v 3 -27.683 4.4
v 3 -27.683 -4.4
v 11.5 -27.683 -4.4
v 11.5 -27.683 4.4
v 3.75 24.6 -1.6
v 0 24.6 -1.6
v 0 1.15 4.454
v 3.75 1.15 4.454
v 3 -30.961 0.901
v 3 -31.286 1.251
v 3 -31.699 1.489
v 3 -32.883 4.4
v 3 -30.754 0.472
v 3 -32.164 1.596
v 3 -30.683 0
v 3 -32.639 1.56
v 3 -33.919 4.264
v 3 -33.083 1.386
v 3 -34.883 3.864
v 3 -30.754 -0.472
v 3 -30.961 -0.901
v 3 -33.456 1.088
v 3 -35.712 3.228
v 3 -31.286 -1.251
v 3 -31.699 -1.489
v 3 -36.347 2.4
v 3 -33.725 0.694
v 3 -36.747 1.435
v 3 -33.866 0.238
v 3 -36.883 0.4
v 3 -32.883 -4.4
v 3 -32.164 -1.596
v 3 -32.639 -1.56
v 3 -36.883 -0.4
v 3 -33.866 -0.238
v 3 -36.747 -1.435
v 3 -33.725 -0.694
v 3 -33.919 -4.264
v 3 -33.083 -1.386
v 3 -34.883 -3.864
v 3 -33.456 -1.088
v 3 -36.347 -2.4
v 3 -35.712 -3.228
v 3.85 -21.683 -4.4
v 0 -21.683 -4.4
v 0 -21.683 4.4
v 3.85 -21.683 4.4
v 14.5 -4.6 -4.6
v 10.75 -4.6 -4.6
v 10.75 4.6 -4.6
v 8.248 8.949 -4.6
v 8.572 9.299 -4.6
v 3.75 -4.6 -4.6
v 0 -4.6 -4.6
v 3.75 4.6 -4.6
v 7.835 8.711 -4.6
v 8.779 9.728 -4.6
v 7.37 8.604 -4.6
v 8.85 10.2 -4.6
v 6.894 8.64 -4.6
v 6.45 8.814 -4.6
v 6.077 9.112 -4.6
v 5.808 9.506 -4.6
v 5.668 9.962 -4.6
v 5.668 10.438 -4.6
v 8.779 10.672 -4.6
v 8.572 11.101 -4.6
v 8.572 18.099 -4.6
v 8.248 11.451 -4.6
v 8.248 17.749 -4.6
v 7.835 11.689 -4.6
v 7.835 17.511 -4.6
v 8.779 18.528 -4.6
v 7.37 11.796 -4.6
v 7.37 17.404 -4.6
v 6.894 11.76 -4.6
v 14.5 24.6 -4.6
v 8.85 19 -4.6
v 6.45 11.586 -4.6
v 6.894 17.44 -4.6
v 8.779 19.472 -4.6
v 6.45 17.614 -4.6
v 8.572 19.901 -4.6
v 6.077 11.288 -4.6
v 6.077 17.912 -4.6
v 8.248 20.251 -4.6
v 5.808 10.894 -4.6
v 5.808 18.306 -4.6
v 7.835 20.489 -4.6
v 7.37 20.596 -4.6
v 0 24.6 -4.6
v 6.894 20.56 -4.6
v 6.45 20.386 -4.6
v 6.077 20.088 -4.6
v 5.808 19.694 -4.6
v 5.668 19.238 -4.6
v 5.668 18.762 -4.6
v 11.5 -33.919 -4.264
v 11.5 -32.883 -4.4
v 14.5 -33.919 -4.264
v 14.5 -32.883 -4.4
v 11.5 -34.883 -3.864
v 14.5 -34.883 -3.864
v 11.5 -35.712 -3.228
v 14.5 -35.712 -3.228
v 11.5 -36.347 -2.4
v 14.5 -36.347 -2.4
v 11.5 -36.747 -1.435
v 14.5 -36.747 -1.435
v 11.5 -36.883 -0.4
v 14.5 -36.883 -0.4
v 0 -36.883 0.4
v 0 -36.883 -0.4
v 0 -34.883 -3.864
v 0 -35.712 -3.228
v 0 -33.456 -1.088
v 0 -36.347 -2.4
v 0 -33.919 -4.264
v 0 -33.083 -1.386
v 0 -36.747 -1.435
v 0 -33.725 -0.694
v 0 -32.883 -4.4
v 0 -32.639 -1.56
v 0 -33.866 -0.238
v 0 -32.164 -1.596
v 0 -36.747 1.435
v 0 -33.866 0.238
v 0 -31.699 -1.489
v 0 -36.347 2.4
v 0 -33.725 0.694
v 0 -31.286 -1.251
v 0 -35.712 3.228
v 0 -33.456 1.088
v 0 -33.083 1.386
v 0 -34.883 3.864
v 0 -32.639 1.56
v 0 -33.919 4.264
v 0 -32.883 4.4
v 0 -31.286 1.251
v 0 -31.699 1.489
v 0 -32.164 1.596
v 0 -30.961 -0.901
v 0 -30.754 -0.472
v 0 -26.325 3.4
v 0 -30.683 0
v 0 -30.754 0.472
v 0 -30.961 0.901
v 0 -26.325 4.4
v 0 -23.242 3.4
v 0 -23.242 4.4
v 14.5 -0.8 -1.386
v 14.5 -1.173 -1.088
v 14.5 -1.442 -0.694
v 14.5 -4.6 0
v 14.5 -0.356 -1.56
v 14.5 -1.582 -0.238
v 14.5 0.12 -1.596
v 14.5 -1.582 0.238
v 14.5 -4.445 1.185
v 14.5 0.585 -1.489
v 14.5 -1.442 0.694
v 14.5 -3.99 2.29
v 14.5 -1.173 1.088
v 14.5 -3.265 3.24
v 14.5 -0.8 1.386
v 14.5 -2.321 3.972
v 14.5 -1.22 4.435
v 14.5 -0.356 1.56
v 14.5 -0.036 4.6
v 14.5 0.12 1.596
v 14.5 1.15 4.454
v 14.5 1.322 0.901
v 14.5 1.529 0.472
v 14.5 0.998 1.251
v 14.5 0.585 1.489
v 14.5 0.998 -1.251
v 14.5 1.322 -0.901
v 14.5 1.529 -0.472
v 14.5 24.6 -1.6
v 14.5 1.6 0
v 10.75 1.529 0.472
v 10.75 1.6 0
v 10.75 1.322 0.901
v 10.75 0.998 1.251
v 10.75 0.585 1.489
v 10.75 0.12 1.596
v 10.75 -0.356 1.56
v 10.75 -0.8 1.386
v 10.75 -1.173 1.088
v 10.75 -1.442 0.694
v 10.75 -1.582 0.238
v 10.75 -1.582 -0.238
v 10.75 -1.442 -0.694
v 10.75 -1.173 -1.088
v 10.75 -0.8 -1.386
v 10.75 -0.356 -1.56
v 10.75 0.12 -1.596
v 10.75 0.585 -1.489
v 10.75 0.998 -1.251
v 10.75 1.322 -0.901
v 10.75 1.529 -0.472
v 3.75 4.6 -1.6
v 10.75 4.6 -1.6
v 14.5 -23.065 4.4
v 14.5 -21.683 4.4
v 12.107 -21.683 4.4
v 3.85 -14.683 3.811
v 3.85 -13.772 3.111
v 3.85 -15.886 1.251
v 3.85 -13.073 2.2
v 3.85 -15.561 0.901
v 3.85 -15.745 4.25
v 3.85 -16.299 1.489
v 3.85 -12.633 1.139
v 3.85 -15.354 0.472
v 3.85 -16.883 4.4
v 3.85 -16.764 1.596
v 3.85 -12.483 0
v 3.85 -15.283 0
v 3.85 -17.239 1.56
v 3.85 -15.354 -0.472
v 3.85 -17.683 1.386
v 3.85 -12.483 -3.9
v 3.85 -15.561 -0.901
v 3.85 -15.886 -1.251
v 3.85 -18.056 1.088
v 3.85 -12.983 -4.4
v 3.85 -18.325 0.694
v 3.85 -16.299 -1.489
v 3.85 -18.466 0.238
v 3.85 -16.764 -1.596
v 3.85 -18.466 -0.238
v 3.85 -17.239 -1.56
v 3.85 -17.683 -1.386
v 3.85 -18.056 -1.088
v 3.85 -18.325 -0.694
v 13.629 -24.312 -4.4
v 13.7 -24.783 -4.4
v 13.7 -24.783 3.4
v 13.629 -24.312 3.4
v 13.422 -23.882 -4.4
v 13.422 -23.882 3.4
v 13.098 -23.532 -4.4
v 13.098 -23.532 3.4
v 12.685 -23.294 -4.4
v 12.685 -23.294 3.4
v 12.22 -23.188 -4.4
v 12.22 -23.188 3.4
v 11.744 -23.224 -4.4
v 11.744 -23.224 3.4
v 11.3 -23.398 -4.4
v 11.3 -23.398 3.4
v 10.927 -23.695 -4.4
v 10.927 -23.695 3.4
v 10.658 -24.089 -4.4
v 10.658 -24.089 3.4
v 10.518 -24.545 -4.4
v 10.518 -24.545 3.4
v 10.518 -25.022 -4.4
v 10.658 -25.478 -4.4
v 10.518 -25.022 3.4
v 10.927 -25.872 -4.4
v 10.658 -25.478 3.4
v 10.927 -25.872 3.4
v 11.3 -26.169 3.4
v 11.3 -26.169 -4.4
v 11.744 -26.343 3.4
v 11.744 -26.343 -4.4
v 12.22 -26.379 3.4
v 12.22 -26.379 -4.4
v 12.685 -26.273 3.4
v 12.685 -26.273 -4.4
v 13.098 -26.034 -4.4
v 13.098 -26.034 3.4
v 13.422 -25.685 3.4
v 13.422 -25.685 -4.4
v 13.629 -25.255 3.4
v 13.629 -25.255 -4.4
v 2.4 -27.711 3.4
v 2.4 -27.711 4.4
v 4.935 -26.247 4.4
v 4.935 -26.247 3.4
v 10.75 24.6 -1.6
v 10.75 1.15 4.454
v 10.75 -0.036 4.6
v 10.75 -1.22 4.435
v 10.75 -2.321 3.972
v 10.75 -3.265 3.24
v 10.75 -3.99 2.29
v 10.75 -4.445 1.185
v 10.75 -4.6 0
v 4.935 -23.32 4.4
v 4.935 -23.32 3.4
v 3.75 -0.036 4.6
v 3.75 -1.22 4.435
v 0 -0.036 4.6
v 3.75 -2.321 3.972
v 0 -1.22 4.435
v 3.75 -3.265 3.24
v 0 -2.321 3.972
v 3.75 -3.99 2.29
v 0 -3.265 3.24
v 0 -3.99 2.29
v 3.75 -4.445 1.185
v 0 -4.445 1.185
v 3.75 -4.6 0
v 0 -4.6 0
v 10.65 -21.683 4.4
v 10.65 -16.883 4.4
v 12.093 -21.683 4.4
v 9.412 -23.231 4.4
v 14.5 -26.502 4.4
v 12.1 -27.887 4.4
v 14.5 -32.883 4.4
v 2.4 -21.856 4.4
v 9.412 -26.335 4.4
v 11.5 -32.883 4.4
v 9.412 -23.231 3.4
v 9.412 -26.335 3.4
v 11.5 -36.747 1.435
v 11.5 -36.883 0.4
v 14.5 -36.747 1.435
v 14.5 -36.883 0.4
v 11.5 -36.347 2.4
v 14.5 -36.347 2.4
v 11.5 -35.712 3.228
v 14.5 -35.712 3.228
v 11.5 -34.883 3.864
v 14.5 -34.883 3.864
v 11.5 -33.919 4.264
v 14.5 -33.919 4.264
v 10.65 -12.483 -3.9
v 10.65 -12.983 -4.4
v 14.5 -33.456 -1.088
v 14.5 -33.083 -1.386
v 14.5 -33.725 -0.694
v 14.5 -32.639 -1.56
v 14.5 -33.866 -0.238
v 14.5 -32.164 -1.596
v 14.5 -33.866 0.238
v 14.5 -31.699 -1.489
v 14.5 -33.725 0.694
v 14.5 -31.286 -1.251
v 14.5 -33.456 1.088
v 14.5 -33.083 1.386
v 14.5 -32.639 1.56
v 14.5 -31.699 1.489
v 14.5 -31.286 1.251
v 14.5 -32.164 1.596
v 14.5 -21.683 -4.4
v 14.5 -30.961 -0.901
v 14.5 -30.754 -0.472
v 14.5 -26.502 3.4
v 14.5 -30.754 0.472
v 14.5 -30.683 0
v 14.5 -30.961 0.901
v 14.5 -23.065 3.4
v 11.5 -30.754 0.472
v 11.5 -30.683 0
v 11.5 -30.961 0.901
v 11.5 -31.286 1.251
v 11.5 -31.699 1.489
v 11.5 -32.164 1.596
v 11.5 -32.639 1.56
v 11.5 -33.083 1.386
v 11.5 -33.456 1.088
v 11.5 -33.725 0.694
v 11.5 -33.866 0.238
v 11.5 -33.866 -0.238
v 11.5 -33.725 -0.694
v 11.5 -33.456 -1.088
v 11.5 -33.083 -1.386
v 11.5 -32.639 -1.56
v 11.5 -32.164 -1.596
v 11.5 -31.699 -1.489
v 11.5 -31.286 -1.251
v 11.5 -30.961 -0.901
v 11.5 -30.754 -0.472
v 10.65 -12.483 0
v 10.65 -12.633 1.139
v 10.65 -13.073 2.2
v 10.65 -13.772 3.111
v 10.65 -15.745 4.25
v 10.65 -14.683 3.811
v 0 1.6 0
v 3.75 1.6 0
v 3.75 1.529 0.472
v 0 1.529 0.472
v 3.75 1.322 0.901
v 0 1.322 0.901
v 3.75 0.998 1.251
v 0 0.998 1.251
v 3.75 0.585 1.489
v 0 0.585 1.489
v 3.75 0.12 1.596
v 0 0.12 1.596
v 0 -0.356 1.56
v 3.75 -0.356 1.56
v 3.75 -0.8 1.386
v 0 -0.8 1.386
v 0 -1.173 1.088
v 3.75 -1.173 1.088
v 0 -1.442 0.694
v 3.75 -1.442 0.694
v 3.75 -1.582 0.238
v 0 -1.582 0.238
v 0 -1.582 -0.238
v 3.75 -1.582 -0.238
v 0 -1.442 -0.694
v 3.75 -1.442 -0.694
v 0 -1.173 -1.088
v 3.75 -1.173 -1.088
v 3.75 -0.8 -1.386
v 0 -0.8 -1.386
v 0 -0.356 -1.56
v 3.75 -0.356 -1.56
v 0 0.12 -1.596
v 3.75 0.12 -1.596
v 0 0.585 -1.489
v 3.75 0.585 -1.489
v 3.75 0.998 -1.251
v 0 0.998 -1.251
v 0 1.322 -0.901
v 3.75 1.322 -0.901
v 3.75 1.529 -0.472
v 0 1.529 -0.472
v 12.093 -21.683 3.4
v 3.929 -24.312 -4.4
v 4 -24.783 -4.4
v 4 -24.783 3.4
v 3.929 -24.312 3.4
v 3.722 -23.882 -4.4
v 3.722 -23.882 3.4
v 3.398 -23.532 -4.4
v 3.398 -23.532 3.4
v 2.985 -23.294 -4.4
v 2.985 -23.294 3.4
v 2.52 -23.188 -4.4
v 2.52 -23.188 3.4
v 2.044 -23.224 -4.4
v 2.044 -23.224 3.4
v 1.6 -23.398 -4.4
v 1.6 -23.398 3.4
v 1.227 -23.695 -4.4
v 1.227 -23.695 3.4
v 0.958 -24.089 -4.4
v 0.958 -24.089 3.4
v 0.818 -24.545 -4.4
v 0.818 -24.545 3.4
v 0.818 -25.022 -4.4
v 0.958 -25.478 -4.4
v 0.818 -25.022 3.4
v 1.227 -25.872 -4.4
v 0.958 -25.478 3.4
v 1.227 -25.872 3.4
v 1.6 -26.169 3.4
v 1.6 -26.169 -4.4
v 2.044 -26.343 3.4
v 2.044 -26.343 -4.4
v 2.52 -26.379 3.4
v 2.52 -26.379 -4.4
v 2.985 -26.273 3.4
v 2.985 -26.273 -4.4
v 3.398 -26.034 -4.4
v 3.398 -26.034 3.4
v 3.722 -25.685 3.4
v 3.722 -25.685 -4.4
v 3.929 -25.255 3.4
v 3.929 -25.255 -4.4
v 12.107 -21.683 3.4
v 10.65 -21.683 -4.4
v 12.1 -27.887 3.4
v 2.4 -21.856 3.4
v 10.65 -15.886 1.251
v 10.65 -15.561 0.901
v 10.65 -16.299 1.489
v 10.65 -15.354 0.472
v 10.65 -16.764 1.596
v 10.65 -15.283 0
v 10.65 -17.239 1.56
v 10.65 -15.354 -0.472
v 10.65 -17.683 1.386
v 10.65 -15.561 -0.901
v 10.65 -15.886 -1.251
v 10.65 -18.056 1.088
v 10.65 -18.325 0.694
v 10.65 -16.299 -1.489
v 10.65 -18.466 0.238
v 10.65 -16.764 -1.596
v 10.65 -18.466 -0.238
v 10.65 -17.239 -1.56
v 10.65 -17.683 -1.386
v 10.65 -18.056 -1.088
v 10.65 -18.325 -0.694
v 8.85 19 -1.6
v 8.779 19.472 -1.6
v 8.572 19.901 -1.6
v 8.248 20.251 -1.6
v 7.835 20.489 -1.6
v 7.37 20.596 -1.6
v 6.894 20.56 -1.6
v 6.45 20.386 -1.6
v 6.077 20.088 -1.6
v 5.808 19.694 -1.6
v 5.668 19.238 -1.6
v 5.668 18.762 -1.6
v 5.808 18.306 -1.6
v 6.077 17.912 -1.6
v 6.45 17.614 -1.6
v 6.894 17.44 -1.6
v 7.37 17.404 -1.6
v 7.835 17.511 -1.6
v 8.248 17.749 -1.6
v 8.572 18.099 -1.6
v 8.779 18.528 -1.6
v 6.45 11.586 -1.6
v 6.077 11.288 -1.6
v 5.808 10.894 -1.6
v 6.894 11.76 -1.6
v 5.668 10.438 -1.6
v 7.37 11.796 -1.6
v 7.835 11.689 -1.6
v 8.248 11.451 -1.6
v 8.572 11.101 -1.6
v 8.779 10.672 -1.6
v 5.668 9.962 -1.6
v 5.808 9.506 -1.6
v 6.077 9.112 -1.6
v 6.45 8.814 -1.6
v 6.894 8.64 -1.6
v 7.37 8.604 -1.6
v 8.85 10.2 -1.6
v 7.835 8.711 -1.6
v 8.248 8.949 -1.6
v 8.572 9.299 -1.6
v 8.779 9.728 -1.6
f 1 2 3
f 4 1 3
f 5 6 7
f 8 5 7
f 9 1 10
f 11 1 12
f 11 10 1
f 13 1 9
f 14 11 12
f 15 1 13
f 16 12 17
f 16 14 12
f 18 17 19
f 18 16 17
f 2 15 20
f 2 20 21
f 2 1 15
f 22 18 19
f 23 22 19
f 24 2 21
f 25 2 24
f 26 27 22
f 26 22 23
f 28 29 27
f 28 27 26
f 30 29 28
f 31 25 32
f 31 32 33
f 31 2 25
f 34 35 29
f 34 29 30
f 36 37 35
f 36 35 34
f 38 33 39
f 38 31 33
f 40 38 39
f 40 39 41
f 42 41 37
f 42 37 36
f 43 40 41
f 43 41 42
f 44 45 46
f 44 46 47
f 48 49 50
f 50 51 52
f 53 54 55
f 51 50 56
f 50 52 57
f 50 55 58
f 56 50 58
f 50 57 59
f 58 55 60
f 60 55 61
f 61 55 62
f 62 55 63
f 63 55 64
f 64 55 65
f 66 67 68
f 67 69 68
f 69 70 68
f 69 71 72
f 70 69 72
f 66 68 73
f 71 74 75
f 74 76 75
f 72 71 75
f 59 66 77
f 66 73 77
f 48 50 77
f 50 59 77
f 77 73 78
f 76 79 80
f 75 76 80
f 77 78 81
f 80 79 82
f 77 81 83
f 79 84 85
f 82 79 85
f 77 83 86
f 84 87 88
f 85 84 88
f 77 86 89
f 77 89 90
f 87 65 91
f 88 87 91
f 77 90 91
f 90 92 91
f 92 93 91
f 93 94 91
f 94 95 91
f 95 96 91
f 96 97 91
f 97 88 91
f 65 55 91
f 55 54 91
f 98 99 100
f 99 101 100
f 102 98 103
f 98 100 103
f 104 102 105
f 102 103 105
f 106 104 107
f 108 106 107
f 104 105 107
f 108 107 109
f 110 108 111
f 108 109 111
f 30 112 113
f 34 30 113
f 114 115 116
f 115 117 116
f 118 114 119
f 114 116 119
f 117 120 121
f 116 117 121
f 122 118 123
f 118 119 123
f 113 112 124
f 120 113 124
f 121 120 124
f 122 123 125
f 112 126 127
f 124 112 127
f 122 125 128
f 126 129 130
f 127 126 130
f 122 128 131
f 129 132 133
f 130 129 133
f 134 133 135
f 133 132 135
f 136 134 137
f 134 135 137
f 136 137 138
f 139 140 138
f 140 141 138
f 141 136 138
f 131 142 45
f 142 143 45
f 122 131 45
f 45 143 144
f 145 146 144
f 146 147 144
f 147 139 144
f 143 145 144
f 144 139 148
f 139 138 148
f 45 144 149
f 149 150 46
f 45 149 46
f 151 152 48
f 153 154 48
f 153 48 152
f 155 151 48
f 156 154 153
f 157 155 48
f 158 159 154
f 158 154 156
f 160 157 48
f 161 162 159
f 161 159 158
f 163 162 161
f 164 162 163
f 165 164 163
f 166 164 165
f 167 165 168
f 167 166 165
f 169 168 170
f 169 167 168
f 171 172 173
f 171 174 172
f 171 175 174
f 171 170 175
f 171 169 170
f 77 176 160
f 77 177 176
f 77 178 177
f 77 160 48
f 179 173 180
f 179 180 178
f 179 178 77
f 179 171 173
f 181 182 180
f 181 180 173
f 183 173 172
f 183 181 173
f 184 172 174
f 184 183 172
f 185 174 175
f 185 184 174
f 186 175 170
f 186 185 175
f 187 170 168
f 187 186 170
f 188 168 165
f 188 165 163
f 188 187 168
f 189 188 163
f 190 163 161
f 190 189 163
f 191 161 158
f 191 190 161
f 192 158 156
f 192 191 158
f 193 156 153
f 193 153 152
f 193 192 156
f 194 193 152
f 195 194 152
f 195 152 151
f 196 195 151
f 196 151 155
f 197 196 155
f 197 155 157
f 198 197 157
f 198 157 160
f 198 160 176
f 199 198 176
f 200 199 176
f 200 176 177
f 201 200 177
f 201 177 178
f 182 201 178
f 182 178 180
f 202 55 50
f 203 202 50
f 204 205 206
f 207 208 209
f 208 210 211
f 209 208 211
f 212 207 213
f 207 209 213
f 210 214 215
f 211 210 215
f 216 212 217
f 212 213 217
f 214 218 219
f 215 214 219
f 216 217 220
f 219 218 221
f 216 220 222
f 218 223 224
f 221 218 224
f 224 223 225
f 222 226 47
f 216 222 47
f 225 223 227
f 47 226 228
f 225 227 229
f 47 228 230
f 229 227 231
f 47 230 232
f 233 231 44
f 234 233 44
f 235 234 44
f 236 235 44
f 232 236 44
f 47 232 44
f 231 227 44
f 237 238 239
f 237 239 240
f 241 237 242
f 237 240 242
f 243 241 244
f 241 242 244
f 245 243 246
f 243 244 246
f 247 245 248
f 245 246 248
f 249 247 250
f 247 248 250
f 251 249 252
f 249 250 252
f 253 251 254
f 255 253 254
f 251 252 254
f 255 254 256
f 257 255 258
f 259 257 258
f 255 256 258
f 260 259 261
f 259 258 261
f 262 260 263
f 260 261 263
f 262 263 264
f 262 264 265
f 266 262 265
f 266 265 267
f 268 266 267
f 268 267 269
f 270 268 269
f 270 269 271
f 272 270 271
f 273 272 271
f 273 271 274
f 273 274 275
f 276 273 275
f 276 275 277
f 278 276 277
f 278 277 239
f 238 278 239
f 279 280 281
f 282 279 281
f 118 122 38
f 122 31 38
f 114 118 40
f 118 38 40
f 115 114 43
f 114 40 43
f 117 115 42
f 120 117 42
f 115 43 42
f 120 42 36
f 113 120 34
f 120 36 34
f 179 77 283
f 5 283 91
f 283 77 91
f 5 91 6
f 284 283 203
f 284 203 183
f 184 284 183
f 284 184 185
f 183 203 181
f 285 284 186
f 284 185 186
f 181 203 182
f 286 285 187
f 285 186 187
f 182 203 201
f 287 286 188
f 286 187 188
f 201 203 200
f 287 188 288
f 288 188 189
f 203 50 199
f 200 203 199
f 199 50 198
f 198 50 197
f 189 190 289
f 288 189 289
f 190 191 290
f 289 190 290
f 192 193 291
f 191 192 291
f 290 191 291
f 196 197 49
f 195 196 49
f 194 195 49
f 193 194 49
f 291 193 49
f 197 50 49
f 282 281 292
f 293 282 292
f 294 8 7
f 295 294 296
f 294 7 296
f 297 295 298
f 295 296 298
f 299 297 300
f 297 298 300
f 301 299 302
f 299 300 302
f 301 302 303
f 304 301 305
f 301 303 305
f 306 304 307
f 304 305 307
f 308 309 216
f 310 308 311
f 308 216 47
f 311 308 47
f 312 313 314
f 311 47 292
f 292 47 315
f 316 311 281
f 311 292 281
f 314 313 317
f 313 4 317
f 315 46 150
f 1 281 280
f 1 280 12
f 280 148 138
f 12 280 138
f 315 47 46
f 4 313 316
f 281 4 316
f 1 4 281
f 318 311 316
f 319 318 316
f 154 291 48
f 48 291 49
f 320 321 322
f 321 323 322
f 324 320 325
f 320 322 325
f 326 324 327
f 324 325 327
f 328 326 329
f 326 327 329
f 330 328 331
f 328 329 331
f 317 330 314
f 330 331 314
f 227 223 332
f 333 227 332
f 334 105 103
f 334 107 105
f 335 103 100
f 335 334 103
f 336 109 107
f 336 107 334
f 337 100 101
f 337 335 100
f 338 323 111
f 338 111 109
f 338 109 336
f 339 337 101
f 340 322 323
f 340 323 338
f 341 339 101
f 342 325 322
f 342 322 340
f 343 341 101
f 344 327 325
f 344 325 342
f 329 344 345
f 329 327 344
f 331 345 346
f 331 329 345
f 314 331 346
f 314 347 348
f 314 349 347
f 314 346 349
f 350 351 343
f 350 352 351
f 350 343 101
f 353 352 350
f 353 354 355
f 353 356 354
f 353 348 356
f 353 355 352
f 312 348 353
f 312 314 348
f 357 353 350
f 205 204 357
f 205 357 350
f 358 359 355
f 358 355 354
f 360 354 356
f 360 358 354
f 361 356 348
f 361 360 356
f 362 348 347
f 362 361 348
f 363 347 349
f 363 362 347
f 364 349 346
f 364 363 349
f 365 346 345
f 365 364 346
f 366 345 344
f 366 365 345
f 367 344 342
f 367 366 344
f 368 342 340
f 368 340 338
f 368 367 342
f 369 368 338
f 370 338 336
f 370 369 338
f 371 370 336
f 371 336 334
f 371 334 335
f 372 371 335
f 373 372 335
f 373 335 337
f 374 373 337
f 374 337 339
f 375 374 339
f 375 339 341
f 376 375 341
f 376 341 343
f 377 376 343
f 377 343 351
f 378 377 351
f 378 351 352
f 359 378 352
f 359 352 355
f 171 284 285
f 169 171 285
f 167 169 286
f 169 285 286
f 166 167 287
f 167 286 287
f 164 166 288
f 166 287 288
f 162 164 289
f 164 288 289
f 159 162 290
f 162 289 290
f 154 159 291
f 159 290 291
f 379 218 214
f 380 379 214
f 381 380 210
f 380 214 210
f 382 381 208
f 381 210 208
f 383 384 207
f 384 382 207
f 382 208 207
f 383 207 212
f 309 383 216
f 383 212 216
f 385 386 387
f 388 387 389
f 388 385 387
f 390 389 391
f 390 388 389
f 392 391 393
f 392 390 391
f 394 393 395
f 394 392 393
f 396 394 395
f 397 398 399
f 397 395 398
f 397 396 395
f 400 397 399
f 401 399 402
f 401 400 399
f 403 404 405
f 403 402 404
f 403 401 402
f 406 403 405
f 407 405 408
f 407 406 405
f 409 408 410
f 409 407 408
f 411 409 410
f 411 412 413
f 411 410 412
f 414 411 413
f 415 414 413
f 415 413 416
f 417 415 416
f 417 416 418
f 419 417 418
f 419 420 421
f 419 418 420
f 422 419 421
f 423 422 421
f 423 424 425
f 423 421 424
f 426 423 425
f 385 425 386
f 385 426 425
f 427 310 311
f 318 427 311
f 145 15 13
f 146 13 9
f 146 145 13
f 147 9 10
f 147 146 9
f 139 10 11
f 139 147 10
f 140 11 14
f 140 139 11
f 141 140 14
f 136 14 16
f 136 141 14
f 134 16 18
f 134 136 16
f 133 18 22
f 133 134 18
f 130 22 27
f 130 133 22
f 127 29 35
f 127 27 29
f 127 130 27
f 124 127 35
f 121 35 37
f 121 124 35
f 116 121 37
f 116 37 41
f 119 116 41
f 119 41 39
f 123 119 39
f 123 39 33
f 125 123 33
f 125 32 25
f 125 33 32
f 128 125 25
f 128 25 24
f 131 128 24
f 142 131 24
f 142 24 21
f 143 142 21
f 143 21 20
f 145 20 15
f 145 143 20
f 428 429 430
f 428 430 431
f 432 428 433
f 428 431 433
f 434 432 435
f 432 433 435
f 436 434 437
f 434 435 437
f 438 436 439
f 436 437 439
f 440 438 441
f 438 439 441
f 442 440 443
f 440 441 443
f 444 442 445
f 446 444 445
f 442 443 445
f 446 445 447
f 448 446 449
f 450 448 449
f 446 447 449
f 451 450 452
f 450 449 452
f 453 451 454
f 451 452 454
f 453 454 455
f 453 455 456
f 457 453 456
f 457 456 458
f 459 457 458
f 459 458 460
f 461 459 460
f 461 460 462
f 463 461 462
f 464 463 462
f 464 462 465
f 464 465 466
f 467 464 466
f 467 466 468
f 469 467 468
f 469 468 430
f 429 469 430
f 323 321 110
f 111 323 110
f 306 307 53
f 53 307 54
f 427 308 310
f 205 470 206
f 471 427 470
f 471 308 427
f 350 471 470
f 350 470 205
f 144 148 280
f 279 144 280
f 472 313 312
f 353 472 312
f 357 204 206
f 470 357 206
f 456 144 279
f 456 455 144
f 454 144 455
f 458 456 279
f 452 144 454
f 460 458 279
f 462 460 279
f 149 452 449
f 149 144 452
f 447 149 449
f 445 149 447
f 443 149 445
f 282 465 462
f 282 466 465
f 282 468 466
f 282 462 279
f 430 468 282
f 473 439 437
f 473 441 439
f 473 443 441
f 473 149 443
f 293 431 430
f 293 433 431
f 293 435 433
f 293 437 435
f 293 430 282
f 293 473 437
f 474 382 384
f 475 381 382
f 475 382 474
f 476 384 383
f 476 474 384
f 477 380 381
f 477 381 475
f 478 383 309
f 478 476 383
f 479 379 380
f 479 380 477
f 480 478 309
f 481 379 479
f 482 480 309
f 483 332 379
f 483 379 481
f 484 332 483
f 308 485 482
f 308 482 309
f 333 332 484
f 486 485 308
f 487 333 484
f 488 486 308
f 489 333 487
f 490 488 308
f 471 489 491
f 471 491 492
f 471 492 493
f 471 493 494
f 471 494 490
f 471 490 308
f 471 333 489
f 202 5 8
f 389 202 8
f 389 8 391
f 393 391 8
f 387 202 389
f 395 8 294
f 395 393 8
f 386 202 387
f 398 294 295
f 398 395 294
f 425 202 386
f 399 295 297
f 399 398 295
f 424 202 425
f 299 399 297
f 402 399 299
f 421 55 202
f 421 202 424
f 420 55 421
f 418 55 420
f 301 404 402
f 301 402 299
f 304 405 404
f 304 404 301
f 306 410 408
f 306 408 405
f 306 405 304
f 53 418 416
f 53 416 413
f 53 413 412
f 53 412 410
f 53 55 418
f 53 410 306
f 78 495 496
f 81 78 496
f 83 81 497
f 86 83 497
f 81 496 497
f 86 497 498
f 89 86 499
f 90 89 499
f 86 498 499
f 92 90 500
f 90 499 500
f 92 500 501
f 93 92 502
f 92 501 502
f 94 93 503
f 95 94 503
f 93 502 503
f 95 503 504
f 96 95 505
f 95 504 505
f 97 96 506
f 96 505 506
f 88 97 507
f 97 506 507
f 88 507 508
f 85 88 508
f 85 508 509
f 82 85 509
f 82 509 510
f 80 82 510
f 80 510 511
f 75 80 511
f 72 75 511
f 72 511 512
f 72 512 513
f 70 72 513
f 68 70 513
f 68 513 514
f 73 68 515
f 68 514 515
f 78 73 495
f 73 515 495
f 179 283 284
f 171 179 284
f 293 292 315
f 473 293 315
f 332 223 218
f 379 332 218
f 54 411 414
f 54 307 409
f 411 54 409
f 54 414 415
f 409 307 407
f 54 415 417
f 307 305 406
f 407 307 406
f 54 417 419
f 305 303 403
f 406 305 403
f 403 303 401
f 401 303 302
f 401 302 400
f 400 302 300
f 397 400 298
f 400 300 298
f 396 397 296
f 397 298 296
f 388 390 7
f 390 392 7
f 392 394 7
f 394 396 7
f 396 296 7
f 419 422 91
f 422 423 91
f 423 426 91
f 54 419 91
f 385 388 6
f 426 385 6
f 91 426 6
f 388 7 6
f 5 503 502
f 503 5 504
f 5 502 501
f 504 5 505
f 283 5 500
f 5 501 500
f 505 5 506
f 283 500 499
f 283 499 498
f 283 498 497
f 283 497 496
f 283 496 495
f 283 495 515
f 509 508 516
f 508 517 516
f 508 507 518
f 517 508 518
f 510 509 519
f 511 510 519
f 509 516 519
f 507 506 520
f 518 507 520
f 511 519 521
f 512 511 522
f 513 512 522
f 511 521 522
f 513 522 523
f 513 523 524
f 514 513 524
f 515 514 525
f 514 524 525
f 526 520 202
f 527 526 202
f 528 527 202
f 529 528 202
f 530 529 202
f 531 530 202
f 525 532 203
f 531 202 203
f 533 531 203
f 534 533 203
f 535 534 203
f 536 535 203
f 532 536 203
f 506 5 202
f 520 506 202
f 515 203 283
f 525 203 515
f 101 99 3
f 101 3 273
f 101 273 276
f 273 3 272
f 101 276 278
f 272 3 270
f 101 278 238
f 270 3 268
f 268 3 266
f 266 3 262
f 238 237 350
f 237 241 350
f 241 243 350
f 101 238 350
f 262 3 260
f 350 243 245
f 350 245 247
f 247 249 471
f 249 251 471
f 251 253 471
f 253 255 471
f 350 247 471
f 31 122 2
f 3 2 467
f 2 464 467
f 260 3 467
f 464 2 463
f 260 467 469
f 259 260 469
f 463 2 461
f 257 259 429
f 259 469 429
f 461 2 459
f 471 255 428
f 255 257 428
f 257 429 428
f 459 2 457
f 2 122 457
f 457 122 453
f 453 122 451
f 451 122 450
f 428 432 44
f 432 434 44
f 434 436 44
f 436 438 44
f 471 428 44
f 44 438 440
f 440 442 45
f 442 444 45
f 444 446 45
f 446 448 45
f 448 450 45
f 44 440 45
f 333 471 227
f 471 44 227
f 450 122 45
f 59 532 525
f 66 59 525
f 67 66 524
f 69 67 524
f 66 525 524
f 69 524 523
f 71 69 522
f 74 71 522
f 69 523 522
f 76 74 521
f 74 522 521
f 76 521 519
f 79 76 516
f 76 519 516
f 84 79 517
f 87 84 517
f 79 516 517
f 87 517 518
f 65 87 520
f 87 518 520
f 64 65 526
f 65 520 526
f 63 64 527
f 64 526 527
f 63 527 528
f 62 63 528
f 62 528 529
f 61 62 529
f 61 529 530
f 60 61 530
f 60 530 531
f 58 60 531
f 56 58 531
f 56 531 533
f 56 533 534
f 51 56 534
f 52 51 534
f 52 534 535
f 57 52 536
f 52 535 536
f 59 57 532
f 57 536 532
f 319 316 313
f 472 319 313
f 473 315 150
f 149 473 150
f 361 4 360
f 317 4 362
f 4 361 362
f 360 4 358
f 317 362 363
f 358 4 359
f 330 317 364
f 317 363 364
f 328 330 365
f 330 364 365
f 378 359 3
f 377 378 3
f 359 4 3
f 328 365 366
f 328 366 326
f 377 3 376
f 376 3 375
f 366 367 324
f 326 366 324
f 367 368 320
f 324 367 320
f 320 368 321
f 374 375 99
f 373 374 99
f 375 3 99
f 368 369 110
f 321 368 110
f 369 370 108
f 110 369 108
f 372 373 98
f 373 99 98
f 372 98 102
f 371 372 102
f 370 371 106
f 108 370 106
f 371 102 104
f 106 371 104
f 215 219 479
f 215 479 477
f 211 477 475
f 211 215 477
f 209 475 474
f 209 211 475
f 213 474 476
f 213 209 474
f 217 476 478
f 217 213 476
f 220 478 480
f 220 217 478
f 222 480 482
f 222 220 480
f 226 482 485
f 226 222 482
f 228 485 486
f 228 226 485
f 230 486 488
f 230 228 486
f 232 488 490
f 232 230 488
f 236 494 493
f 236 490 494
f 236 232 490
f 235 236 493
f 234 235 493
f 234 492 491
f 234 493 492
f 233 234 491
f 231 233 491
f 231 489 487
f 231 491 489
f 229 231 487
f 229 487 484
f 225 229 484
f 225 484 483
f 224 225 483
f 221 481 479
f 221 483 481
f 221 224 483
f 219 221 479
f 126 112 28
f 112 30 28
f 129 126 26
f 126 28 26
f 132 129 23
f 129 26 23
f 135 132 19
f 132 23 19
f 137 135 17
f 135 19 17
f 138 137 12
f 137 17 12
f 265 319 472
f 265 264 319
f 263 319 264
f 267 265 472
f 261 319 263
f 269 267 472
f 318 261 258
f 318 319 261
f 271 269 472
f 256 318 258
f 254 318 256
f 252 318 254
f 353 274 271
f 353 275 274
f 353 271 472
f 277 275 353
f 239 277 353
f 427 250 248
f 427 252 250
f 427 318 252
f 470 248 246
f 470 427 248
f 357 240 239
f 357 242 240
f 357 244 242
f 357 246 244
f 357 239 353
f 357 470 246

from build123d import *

# Parameters (mm, degrees)
F0_R      = 1.6
F1_DEPTH  = 14.5
F2_W      = 3.85
F2_H      = 9.2
F2_W_2    = 7
F2_W_3    = 8.5
F3_DEPTH  = 19.8727577452
F4_R      = 1.6
F5_DEPTH  = 8.8
F6_DEPTH  = 1
F7_R      = 4
F9_W      = 7
F9_H      = 20
F10_DEPTH = 5.17
F11_R     = 1.6
F12_DEPTH = 3
F13_SIZE  = 0.5


with BuildPart() as f1:
    # F0 (on Right) → F1 (new body)
    with BuildSketch(Plane.YZ):
        with BuildLine():
            ThreePointArc((-16.883386299, -4.4), (-21.283386299, 0), (-16.883386299, 4.4))
            Line((-16.883386299, 4.4), (-36.883386299, 4.4))
            Line((-36.883386299, 4.4), (-36.883386299, -4.4))
            Line((-36.883386299, -4.4), (-16.883386299, -4.4))
        make_face()
        with Locations((-32.283386299, 0)):
            Circle(F0_R, mode=Mode.SUBTRACT)
        with BuildLine():
            ThreePointArc((-16.883386299, -4.4), (-13.7721164618, -3.1112698372), (-12.483386299, 0))
            ThreePointArc((-12.483386299, 0), (-13.7721164618, 3.1112698372), (-16.883386299, 4.4))
            ThreePointArc((-16.883386299, 4.4), (-21.283386299, 0), (-16.883386299, -4.4))
        make_face()
        with Locations((-16.883386299, 0)):
            Circle(F0_R, mode=Mode.SUBTRACT)
        with BuildLine():
            Line((-12.483386299, -4.4), (-12.483386299, 0))
            ThreePointArc((-12.483386299, 0), (-13.7721164618, -3.1112698372), (-16.883386299, -4.4))
            Line((-16.883386299, -4.4), (-12.483386299, -4.4))
        make_face()
    extrude(amount=F1_DEPTH)


with BuildPart() as f1b:
    # F0 (on Right) → F1, piece 2 (new body)
    with BuildSketch(Plane.YZ):
        with BuildLine():
            ThreePointArc((1.149851697, 4.4539691372), (-2.816973748, 3.6365724114), (-4.6, 0))
            ThreePointArc((-4.6, 0), (-3.2526911935, -3.2526911935), (0, -4.6))
            ThreePointArc((0, -4.6), (3.2526911935, -3.2526911935), (4.6, 0))
            ThreePointArc((4.6, 0), (3.6365724114, 2.816973748), (1.149851697, 4.4539691372))
        make_face()
        Circle(F0_R, mode=Mode.SUBTRACT)
        with BuildLine():
            ThreePointArc((4.6, 0), (3.2526911935, -3.2526911935), (0, -4.6))
            Line((0, -4.6), (24.6, -4.6))
            Line((24.6, -4.6), (24.6, -1.6))
            Line((24.6, -1.6), (1.149851697, 4.4539691372))
            ThreePointArc((1.149851697, 4.4539691372), (3.6365724114, 2.816973748), (4.6, 0))
        make_face()
        with BuildLine():
            ThreePointArc((0, -4.6), (-3.2526911935, -3.2526911935), (-4.6, 0))
            Line((-4.6, 0), (-4.6, -4.6))
            Line((-4.6, -4.6), (0, -4.6))
        make_face()
    extrude(amount=F1_DEPTH)


with BuildPart() as f3_tool:
    # F2 (on face) → F3 (new body, up to face)
    with BuildSketch(Plane(origin=(0, 0, -4.6), x_dir=(1, 0, 0), z_dir=(0, 0, -1))):
        with Locations((1.925, 17.083386299)):
            Rectangle(F2_W, F2_H)
        with Locations((12.575, 17.083386299)):
            Rectangle(F2_W, F2_H)
        with Locations((7.25, 0)):
            Rectangle(F2_W_2, F2_H)
        with Locations((7.25, 32.283386299)):
            Rectangle(F2_W_3, F2_H)
    extrude(amount=-F3_DEPTH)


with BuildPart() as f1_1:
    add(f1.part)

    # F3: cut by f3_tool
    add(f3_tool.part, mode=Mode.SUBTRACT)

    # F4 (on face) → F5 (cut, through all)
    with BuildSketch(Plane.XY.offset(4.4)):
        with Locations((2.4, -24.783386299)):
            Circle(F4_R)
        with Locations((12.1, -24.783386299)):
            Circle(F4_R)
    extrude(amount=-F5_DEPTH, mode=Mode.SUBTRACT)

    # F4 (on face) → F6 (cut)
    with BuildSketch(Plane.XY.offset(4.4)):
        Polygon((0, -23.2415896397), (0, -26.3251829583), (2.4, -27.7108236044), (4.9352350744, -26.2471049517), (4.9352350744, -23.3196676463), (2.4, -21.8559489936), align=None)
        with Locations((2.4, -24.783386299)):
            Circle(F4_R, mode=Mode.SUBTRACT)
        Polygon((12.1067976077, -21.683386299), (12.0932023923, -21.683386299), (9.4119224444, -23.2314239987), (9.4119224444, -26.3353485993), (12.1, -27.8873108997), (14.5, -26.5016702536), (14.5, -23.0651023444), align=None)
        with Locations((12.1, -24.783386299)):
            Circle(F4_R, mode=Mode.SUBTRACT)
    extrude(amount=-F6_DEPTH, mode=Mode.SUBTRACT)

    # F7
    f7_edges = [f1_1.edges().sort_by_distance(p)[0] for p in [
        (13, -36.883386, 4.4),
        (13, -36.883386, -4.4),
        (1.5, -36.883386, 4.4),
        (1.5, -36.883386, -4.4),
    ]]
    fillet(f7_edges, radius=F7_R)

    # F13
    f13_edges = [f1_1.edges().sort_by_distance(p)[0] for p in [
        (7.25, -12.483386, -4.4),
    ]]
    chamfer(f13_edges, length=F13_SIZE)


with BuildPart() as f1b_1:
    add(f1b.part)

    # F3: cut by f3_tool
    add(f3_tool.part, mode=Mode.SUBTRACT)

    # F9 (on offset) → F10 (cut, through all)
    with BuildSketch(Plane(origin=(0, 0, 3.57), x_dir=(1, 0, 0), z_dir=(0, 0, -1))):
        with Locations((7.25, -14.6)):
            Rectangle(F9_W, F9_H)
    extrude(amount=F10_DEPTH, mode=Mode.SUBTRACT)

    # F11 (on face) → F12 (cut, through all)
    with BuildSketch(Plane.XY.offset(-1.6)):
        with Locations((7.25, 19)):
            Circle(F11_R)
        with Locations((7.25, 10.2)):
            Circle(F11_R)
    extrude(amount=-F12_DEPTH, mode=Mode.SUBTRACT)


solid = Compound([f1_1.part, f1b_1.part])
